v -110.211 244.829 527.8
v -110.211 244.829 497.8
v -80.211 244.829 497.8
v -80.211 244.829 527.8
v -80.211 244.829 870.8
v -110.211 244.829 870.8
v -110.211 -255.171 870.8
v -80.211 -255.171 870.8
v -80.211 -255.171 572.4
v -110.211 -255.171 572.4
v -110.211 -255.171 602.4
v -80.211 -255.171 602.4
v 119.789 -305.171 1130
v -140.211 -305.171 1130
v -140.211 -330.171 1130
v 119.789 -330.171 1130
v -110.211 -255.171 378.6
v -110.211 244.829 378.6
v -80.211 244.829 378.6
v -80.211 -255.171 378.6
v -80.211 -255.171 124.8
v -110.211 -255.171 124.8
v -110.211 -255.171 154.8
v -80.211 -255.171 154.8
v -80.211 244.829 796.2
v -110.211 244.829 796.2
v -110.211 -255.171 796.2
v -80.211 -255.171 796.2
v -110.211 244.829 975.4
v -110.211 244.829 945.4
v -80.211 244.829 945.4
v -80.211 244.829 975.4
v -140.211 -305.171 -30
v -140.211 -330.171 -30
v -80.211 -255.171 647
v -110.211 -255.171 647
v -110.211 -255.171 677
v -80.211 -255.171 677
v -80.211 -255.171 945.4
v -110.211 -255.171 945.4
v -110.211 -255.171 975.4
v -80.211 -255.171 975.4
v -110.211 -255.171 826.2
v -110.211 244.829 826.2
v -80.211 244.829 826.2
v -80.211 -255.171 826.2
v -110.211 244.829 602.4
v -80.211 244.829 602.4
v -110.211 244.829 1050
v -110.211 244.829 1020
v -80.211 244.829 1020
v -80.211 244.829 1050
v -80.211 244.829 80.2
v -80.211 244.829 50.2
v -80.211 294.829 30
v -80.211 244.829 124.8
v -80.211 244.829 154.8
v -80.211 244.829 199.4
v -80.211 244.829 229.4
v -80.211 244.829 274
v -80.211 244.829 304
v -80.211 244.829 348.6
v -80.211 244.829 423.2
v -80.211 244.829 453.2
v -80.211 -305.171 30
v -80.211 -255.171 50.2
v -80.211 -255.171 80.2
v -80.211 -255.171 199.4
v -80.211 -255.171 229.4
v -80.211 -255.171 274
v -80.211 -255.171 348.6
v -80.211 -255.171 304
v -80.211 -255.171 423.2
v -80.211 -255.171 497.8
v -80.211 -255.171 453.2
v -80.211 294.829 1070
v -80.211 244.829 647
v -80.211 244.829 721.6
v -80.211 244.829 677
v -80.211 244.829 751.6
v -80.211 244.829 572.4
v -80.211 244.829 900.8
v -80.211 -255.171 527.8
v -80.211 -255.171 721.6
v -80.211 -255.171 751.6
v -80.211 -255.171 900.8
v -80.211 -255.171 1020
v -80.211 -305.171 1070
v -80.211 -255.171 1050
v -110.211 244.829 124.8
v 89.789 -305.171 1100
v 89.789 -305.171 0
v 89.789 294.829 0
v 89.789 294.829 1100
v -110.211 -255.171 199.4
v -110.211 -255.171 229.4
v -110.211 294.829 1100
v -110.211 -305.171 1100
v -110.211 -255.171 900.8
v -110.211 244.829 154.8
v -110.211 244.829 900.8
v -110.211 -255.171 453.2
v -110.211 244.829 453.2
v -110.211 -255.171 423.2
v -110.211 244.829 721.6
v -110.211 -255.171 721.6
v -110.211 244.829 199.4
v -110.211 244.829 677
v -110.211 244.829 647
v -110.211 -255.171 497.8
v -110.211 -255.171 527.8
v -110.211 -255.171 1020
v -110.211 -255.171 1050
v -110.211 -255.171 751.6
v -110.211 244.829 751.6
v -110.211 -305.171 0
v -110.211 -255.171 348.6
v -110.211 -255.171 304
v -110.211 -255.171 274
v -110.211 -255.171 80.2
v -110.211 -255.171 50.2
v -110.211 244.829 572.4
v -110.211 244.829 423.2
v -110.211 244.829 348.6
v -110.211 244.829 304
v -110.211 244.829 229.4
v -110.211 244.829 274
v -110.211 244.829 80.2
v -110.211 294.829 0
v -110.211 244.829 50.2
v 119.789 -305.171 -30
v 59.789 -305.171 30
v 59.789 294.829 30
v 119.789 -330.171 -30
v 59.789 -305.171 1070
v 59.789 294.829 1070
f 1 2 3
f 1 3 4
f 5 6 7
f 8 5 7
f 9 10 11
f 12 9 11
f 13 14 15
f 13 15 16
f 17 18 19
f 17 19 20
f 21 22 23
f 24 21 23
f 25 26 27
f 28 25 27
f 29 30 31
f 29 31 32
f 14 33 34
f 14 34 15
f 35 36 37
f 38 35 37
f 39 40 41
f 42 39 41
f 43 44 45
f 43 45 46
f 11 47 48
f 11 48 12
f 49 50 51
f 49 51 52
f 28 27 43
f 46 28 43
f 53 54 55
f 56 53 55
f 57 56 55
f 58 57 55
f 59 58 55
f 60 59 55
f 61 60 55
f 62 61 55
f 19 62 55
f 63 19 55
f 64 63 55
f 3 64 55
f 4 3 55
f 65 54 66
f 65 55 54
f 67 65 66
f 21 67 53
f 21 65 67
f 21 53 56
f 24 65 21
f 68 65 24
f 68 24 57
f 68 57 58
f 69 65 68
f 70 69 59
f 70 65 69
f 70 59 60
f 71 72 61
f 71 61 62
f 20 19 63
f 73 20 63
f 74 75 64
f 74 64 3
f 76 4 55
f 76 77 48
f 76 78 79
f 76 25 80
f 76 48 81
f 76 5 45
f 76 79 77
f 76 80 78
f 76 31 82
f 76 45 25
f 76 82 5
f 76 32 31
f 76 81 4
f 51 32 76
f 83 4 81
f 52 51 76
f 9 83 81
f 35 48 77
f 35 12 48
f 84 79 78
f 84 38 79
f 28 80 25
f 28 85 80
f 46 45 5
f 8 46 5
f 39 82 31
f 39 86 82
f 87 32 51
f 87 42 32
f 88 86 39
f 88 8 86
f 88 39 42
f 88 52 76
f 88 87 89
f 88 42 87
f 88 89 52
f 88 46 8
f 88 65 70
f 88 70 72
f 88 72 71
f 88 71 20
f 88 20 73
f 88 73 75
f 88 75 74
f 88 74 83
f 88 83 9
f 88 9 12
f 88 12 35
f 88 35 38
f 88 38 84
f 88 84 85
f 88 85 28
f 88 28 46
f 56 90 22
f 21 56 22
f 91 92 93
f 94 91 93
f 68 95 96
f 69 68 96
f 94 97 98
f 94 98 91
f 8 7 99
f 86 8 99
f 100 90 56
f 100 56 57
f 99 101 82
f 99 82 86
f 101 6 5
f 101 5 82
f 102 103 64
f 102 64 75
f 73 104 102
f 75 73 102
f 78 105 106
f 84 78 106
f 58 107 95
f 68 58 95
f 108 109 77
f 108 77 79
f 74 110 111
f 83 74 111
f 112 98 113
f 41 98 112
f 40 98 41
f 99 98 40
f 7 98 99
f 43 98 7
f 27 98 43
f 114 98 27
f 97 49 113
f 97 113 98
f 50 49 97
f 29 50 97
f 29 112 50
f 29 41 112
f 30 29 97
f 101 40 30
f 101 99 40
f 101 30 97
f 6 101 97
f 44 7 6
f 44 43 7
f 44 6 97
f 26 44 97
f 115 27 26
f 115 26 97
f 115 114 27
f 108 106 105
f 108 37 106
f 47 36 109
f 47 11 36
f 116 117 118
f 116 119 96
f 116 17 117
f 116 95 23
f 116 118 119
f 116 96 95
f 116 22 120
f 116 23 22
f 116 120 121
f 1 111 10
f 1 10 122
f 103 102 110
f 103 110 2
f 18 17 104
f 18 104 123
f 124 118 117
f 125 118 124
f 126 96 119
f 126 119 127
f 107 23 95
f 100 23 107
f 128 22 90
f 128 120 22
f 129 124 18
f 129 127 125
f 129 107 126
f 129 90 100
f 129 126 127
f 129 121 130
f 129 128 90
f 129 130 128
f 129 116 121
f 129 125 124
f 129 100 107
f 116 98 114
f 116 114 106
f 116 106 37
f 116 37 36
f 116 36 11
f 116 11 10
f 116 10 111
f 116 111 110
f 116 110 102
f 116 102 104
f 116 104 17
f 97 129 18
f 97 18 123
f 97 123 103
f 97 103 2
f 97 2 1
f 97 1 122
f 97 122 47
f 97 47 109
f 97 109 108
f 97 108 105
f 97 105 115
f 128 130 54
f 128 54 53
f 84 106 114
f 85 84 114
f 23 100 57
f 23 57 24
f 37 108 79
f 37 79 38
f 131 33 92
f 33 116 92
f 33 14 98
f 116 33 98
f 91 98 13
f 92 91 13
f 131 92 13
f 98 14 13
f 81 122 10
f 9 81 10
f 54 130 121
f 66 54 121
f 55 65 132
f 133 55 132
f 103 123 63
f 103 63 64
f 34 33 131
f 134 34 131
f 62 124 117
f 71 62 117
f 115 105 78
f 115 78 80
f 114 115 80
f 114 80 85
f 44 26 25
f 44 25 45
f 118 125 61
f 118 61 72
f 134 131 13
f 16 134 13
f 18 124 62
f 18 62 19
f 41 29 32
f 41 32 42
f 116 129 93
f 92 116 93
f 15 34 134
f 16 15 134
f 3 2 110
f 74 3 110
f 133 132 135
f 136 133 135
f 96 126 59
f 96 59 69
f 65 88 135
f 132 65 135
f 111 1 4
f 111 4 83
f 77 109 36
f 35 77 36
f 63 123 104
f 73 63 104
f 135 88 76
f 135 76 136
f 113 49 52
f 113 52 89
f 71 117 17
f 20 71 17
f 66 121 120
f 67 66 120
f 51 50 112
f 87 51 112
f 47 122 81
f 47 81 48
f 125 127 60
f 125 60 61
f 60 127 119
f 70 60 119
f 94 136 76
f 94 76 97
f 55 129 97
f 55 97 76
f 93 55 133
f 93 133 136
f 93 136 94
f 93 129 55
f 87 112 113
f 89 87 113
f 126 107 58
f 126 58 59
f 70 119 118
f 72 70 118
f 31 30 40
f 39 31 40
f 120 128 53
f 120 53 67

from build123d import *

# Parameters (mm, degrees)
F0_W     = 200
F0_H     = 600
F1_DEPTH = 1100
F2_W     = 140
F2_H     = 1040
F3_DEPTH = 600
F4_W     = 500
F4_H     = 30
F5_DEPTH = 30
F6_W     = 260
F6_H     = 1160
F6_W_2   = 200
F6_H_2   = 1100
F7_DEPTH = 25


with BuildPart() as f1:
    # F0 (on Top) → F1 (new body)
    with BuildSketch(Plane.XY):
        with Locations((-10.210905, -5.170632)):
            Rectangle(F0_W, F0_H)
    extrude(amount=F1_DEPTH)

    # F2 (on face) → F3 (cut, through all)
    with BuildSketch(Plane.XZ.offset(305.170632)):
        with Locations((-10.210905, 550)):
            Rectangle(F2_W, F2_H)
    extrude(amount=-F3_DEPTH, mode=Mode.SUBTRACT)

    # F4 (on face) → F5 (cut)
    with BuildSketch(Plane(origin=(-110.210905, 0, 0), x_dir=(0, -1, 0), z_dir=(-1, 0, 0))):
        with Locations((5.170632, 1035)):
            Rectangle(F4_W, F4_H)
        with Locations((5.170632, 960.4)):
            Rectangle(F4_W, F4_H)
        with Locations((5.170632, 885.8)):
            Rectangle(F4_W, F4_H)
        with Locations((5.170632, 811.2)):
            Rectangle(F4_W, F4_H)
        with Locations((5.170632, 736.6)):
            Rectangle(F4_W, F4_H)
        with Locations((5.170632, 662)):
            Rectangle(F4_W, F4_H)
        with Locations((5.170632, 587.4)):
            Rectangle(F4_W, F4_H)
        with Locations((5.170632, 512.8)):
            Rectangle(F4_W, F4_H)
        with Locations((5.170632, 438.2)):
            Rectangle(F4_W, F4_H)
        with Locations((5.170632, 363.6)):
            Rectangle(F4_W, F4_H)
        with Locations((5.170632, 289)):
            Rectangle(F4_W, F4_H)
        with Locations((5.170632, 214.4)):
            Rectangle(F4_W, F4_H)
        with Locations((5.170632, 139.8)):
            Rectangle(F4_W, F4_H)
        with Locations((5.170632, 65.2)):
            Rectangle(F4_W, F4_H)
    extrude(amount=-F5_DEPTH, mode=Mode.SUBTRACT)

    # F6 (on face) → F7 (join)
    with BuildSketch(Plane.XZ.offset(305.170632)):
        with Locations((-10.210905, 550)):
            Rectangle(F6_W, F6_H)
        with Locations((-10.210905, 550)):
            Rectangle(F6_W_2, F6_H_2, mode=Mode.SUBTRACT)
        with Locations((-10.210905, 550)):
            Rectangle(F6_W_2, F6_H_2)
    extrude(amount=F7_DEPTH)


solid = f1.part
